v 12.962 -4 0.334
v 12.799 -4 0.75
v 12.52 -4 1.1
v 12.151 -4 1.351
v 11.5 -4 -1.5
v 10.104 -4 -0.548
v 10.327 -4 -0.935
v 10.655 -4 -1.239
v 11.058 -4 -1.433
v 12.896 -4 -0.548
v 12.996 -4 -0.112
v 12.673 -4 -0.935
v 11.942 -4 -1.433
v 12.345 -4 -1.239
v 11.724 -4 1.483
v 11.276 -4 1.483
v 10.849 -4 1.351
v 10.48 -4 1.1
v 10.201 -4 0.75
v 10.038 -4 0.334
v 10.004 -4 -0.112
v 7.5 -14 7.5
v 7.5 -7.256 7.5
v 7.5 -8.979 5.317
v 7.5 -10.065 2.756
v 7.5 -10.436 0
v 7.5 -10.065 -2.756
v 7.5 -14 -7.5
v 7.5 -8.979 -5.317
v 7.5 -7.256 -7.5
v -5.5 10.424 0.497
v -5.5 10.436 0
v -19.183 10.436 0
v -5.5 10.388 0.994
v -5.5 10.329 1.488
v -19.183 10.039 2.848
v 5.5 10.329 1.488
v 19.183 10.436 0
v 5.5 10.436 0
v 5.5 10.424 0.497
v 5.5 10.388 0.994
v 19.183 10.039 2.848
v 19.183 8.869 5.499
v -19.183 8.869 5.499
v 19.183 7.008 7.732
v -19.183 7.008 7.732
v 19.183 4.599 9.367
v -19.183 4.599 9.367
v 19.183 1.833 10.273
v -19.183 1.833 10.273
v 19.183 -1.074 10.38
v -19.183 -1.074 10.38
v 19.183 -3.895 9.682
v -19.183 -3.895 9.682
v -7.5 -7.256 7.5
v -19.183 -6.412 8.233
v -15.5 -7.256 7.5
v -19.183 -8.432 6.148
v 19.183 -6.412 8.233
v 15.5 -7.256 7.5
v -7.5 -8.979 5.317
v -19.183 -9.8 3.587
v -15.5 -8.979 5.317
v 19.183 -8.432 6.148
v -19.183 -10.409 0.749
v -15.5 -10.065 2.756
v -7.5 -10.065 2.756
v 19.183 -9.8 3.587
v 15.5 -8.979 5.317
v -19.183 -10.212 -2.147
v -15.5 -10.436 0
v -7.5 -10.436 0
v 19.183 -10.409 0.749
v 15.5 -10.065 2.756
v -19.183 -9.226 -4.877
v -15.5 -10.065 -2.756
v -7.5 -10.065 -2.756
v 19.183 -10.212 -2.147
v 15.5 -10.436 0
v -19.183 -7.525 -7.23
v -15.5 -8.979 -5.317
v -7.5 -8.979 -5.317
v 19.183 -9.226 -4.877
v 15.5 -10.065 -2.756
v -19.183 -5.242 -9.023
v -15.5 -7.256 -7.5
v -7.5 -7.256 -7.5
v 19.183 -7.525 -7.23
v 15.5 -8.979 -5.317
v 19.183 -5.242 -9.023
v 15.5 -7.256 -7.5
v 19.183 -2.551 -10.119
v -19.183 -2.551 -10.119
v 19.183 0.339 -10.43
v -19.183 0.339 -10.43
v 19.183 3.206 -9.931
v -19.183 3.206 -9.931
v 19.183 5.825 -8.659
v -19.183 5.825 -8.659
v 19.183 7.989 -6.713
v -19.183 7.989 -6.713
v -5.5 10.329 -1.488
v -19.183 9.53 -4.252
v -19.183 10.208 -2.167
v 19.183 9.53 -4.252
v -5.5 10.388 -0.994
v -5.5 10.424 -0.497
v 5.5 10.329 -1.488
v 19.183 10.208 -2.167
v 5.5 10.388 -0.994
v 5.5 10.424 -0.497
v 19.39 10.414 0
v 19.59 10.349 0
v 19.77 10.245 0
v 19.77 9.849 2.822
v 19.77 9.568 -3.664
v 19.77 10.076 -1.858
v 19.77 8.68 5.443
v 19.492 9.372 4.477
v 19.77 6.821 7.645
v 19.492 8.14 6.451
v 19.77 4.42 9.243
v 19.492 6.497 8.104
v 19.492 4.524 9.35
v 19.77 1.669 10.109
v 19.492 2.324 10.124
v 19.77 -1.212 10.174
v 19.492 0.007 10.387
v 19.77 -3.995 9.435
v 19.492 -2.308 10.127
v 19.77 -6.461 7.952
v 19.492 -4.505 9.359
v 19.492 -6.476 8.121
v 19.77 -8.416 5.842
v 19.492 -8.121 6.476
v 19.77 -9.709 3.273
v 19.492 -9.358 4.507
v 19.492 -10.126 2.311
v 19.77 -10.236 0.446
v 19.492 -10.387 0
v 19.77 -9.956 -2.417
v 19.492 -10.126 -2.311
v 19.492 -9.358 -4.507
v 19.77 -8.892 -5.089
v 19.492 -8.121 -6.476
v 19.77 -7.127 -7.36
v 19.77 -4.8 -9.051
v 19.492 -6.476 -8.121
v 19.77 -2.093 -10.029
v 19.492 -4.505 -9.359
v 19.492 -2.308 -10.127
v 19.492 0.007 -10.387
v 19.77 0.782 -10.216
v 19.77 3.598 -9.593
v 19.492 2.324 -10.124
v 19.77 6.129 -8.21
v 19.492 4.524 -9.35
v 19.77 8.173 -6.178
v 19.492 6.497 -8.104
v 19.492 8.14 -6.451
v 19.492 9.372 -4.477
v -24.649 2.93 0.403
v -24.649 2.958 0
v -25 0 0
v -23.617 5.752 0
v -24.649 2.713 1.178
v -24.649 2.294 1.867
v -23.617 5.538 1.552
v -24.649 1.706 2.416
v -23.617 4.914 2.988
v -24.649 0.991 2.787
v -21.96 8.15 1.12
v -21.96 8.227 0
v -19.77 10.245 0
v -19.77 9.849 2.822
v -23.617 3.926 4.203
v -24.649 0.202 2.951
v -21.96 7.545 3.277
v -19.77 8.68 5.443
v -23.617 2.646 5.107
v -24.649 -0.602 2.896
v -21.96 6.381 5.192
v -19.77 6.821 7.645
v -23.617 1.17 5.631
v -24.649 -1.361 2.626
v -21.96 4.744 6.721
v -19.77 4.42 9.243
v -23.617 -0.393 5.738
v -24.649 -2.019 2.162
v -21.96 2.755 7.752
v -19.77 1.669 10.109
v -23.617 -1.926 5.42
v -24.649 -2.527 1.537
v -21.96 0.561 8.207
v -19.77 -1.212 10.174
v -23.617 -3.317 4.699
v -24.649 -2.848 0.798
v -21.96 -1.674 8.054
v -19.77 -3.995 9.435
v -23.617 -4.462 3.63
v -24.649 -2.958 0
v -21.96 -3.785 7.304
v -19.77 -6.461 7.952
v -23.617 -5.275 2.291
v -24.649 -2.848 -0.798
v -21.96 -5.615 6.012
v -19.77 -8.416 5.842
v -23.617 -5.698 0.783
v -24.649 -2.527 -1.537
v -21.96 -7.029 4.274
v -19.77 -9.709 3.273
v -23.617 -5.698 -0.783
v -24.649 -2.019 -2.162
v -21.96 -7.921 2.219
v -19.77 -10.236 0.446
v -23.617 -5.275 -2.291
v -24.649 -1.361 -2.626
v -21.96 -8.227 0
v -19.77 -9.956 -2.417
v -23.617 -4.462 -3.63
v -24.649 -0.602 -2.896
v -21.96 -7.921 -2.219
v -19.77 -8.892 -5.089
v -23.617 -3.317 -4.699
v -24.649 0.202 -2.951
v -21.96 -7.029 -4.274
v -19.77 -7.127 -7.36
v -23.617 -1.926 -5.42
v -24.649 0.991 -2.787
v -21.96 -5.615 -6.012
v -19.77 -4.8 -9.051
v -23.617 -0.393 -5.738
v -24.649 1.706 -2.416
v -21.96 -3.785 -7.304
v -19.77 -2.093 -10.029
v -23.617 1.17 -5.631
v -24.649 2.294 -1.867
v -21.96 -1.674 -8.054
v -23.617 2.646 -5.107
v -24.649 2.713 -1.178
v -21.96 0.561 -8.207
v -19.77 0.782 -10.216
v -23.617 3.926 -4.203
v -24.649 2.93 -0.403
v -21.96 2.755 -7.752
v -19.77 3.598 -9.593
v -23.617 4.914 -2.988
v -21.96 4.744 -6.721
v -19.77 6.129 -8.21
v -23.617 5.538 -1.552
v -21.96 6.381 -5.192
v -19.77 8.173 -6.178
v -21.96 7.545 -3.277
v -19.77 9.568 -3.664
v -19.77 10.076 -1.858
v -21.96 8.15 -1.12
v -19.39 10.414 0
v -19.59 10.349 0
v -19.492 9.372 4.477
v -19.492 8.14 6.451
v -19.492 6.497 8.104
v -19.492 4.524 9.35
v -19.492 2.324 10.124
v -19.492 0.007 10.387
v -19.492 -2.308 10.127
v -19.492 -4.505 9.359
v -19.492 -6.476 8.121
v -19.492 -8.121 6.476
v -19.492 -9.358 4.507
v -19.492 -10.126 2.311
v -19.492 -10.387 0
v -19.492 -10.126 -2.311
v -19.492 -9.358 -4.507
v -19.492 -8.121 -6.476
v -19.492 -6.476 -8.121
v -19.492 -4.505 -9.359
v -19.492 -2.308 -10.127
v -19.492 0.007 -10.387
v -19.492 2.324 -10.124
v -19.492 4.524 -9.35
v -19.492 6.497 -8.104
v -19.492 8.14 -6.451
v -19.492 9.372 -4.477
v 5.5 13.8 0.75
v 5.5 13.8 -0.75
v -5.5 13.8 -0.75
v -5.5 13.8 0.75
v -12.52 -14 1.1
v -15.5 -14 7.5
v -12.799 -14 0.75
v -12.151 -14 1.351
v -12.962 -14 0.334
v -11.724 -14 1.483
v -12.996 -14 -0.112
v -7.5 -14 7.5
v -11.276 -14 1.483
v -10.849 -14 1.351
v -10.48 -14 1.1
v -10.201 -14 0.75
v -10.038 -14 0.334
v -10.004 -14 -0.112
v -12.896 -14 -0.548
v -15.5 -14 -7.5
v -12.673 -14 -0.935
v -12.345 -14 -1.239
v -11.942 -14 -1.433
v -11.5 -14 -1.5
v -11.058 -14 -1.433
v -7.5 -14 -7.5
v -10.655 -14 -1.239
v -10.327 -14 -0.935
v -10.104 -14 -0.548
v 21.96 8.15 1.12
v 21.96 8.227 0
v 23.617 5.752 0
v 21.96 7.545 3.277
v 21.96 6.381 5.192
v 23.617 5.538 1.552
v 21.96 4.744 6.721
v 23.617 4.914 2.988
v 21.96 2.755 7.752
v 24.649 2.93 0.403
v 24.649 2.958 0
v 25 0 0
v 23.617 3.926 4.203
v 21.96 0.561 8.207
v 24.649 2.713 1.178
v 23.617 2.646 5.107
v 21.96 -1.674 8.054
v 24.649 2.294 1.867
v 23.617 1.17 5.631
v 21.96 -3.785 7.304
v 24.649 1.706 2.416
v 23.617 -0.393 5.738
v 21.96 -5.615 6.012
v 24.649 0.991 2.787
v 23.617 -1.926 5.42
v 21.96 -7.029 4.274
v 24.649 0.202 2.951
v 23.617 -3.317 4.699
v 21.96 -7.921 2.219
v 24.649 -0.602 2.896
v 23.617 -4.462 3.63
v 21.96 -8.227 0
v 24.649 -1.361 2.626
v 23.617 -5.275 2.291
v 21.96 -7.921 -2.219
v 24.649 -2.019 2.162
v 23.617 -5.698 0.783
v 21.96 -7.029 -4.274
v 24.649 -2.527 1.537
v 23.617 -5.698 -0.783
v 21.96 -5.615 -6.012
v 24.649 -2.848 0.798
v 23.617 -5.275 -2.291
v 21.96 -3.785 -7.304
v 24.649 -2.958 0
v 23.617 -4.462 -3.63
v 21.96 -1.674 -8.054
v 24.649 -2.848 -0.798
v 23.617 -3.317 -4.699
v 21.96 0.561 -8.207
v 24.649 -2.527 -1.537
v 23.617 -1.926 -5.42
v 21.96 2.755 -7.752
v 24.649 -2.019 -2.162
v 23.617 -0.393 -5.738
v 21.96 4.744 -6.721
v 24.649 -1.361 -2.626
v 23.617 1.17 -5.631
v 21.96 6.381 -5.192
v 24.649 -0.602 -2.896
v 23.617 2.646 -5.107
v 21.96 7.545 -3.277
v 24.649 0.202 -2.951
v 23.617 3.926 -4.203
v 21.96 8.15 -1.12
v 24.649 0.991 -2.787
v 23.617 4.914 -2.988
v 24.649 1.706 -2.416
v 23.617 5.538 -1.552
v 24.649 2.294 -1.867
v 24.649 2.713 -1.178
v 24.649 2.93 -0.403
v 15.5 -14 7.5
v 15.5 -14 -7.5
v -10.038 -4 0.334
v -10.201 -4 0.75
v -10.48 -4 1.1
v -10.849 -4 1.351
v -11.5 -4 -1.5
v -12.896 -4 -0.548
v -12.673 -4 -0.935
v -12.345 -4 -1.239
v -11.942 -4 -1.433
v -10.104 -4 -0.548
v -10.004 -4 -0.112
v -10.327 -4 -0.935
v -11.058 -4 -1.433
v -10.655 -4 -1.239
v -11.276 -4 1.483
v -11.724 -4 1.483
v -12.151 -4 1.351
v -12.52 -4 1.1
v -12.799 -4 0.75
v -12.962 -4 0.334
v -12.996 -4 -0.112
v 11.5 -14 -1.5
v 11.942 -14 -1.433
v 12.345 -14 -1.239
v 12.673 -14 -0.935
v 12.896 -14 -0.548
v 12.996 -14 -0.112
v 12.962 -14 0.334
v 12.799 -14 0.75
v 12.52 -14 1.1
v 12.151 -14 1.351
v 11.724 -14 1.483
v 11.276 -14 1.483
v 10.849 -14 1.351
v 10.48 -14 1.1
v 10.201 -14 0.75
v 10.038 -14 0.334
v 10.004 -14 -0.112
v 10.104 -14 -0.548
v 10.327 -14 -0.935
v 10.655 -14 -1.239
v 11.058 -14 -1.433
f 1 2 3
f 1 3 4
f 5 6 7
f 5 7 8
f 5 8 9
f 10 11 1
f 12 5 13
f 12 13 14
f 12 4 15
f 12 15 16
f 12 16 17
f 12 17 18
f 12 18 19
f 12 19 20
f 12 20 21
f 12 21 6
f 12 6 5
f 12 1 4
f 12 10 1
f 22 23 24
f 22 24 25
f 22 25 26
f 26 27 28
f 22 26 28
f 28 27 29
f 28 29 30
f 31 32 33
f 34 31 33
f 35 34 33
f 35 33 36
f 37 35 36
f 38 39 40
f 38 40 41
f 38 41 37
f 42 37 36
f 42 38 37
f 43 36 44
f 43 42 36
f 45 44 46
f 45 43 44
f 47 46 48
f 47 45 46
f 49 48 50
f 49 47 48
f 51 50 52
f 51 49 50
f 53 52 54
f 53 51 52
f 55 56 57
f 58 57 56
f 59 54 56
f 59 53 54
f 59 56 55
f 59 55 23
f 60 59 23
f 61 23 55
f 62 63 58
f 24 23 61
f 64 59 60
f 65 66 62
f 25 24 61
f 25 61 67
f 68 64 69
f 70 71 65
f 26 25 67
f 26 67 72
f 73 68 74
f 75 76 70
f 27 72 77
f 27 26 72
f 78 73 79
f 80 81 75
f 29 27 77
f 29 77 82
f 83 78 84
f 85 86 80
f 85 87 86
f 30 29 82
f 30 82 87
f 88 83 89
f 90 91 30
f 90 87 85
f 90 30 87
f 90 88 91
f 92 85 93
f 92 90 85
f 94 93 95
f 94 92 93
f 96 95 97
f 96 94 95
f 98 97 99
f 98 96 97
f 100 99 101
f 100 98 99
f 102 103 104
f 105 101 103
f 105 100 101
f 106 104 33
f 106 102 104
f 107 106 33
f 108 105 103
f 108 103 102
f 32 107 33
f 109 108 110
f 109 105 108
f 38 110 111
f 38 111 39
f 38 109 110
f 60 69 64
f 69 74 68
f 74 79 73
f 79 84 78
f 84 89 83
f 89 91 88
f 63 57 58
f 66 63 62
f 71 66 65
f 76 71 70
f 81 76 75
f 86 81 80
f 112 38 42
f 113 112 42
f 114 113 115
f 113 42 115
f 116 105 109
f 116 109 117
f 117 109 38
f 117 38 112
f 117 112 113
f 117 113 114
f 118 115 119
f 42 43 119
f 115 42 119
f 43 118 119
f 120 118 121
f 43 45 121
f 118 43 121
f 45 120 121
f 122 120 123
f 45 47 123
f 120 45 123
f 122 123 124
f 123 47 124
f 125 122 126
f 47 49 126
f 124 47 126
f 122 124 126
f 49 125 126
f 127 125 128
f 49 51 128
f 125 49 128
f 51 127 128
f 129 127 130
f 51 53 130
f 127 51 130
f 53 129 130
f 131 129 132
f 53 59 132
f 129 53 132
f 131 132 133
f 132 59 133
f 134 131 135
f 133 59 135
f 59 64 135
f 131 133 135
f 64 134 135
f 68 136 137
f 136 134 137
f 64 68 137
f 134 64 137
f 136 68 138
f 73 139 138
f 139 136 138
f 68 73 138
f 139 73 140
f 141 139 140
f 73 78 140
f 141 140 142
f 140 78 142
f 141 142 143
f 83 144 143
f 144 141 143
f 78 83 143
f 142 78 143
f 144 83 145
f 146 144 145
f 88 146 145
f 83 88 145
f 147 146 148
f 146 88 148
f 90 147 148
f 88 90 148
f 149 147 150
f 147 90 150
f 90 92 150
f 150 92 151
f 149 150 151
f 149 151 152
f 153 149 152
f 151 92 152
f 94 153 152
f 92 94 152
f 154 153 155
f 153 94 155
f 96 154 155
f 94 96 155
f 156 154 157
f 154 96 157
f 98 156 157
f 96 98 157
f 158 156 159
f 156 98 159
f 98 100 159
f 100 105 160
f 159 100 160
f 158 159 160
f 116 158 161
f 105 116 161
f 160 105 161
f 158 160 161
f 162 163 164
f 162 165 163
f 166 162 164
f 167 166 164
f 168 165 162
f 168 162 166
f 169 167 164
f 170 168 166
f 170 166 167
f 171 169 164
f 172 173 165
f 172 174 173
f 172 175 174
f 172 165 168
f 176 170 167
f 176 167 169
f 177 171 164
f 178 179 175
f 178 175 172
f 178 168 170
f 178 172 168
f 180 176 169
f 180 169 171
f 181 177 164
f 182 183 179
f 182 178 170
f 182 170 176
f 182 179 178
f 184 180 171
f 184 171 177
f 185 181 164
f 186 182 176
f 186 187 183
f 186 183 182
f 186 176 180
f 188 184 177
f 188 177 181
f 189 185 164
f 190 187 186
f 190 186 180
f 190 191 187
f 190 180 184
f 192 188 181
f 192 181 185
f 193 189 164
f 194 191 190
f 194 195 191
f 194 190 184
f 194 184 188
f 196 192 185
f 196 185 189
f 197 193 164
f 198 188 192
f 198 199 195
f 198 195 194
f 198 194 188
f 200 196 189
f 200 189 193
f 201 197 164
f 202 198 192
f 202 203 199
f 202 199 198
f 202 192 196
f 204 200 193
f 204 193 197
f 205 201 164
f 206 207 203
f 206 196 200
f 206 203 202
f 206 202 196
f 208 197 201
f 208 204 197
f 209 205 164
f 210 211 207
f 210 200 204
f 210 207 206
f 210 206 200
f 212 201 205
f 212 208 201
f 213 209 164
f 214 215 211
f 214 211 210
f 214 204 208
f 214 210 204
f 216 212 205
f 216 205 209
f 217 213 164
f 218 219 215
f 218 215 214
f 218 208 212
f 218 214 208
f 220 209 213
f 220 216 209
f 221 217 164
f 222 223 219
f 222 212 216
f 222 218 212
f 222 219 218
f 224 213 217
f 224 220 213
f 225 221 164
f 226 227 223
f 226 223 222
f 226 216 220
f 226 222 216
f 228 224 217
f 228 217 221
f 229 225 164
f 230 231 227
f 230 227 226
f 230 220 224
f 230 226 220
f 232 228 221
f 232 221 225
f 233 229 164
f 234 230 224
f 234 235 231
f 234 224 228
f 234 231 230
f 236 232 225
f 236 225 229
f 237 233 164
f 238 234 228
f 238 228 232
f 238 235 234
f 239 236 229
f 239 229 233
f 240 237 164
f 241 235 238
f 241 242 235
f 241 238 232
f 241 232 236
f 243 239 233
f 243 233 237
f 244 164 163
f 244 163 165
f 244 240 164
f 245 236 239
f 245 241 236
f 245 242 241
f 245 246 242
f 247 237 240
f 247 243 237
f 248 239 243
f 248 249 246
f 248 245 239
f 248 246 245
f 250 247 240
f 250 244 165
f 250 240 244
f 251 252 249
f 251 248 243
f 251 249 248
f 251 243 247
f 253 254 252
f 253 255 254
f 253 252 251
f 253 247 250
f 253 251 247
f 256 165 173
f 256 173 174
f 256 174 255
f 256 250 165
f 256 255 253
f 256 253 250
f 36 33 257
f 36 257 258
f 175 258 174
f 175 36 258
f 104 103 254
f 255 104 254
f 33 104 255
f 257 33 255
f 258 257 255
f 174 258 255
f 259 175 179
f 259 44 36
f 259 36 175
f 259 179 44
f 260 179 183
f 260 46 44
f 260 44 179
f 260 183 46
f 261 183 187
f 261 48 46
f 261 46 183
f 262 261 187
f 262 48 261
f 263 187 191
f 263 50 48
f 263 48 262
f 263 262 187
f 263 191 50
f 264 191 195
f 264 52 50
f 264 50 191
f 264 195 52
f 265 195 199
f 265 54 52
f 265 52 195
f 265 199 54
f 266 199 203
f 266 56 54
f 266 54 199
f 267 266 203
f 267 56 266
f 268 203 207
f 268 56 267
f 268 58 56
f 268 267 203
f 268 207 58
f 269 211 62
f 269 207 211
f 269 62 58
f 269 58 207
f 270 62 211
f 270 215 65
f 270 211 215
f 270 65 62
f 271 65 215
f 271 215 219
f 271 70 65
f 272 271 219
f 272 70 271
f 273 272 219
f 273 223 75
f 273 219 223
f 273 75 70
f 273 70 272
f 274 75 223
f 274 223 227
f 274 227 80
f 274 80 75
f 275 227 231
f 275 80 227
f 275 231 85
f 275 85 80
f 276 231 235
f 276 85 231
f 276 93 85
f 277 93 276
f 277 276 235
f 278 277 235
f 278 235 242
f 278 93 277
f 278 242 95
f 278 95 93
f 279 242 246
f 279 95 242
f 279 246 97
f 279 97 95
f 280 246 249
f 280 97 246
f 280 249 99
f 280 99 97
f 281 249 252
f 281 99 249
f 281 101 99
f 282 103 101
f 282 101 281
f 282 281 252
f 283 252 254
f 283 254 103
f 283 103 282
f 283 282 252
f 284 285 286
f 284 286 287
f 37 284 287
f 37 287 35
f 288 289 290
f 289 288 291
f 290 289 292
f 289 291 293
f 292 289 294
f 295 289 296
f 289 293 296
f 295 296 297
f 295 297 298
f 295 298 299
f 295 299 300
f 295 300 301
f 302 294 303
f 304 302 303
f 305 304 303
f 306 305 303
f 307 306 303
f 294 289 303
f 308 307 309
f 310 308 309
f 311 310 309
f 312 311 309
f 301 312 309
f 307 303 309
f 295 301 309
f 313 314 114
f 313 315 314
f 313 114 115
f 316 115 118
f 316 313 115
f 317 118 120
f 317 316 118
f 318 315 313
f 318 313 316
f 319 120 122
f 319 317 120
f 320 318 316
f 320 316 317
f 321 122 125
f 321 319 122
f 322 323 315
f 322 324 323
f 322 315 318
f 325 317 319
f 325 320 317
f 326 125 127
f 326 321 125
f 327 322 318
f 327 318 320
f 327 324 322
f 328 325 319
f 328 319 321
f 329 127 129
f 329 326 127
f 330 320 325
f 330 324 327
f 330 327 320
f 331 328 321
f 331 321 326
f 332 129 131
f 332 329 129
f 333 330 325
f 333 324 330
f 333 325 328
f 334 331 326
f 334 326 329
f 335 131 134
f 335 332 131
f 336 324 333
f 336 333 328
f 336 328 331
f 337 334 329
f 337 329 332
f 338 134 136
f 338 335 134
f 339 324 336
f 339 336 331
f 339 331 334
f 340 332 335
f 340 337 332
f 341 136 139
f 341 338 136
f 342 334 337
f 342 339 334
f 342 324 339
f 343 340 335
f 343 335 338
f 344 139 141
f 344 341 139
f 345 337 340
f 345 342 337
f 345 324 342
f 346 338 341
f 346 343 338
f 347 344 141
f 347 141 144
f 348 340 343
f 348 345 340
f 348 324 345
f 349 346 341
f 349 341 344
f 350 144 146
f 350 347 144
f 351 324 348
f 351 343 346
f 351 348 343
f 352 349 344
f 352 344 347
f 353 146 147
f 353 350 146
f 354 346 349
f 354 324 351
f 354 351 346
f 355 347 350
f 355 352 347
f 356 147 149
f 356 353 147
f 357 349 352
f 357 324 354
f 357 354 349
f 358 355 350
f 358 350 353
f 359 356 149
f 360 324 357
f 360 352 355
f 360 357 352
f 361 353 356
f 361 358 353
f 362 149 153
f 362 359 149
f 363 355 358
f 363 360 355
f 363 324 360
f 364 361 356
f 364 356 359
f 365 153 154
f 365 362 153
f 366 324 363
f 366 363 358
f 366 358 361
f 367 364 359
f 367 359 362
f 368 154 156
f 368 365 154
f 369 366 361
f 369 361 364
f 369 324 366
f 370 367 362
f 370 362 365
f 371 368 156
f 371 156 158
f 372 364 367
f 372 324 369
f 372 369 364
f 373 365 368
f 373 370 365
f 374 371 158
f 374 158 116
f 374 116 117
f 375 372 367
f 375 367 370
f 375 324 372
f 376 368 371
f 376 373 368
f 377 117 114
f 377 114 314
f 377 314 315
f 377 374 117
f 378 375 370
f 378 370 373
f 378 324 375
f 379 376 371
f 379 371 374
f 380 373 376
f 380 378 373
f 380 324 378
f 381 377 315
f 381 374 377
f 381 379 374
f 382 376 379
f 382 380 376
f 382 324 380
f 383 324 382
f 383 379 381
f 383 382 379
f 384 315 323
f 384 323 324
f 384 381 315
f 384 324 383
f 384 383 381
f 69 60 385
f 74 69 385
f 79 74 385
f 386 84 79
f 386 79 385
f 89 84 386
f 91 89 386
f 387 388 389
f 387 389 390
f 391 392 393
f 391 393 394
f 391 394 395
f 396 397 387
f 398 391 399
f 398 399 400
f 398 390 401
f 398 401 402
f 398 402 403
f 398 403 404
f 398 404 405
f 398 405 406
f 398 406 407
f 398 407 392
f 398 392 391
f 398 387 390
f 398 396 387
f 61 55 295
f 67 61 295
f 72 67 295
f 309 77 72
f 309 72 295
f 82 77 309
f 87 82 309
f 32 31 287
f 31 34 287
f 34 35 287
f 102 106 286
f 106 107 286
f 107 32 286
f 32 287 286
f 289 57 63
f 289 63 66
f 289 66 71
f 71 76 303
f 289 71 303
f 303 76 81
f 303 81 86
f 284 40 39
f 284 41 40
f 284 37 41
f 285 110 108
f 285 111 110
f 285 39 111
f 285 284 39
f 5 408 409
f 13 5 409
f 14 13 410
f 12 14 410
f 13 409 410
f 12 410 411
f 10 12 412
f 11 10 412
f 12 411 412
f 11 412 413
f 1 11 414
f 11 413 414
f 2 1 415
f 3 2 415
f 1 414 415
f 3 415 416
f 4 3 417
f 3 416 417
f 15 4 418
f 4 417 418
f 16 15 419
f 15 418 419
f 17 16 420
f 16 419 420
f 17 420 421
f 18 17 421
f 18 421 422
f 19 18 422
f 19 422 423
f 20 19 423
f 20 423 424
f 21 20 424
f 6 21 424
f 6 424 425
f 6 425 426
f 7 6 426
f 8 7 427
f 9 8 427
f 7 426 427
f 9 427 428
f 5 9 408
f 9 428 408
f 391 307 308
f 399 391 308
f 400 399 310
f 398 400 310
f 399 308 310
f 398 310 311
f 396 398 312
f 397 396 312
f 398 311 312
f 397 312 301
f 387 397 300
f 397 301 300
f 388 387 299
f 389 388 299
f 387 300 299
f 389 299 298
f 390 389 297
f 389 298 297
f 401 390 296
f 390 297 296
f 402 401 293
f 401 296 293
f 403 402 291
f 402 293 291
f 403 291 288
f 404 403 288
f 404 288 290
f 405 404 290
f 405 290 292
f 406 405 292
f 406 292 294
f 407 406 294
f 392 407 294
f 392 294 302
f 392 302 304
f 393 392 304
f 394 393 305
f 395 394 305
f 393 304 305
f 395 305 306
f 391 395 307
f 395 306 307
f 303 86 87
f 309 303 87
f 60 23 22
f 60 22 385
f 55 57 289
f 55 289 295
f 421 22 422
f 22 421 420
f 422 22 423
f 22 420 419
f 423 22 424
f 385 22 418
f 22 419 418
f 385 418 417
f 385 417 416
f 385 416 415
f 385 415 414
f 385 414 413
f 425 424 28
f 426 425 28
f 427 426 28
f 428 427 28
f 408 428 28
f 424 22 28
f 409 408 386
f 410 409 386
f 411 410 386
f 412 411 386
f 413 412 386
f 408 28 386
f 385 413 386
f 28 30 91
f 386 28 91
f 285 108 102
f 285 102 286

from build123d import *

# Parameters (mm, degrees)
SKETCH_3_W          = 8
SKETCH_3_H          = 15
EXTRUDE_1_DEPTH     = 14
SKETCH_4_R          = 1.5
CUT_EXTRUDE_1_DEPTH = 10
FILLET_1_R          = 1
EXTRUDE_2_DEPTH     = 5.5


with BuildPart() as part:
    # ｽｹｯﾁ1 → 回転2 (revolve)
    with BuildSketch(Plane.XY):
        with BuildLine():
            Line((-19.5, 10.435516279), (19.5, 10.435516279))
            ThreePointArc((19.5, 10.435516279), (23.540844472, 5.898092912), (25, 0))
            Line((25, 0), (-25, 0))
            ThreePointArc((-25, 0), (-23.540844472, 5.898092912), (-19.5, 10.435516279))
        make_face()
    revolve(axis=Axis((-19.5, 0, 0), (1, 0, 0)))

    # ｽｹｯﾁ3 → ﾎﾞｽ - 押し出し1 (add)
    with BuildSketch(Plane(origin=(0, 0, 0), x_dir=(1, 0, 0), z_dir=(0, 1, 0))):
        with Locations((-11.5, 0)):
            Rectangle(SKETCH_3_W, SKETCH_3_H)
        with Locations((11.5, 0)):
            Rectangle(SKETCH_3_W, SKETCH_3_H)
    extrude(amount=-EXTRUDE_1_DEPTH)

    # ｽｹｯﾁ4 → ｶｯﾄ - 押し出し1 (cut)
    with BuildSketch(Plane(origin=(0, -14, 0), x_dir=(-1, 0, 0), z_dir=(0, -1, 0))):
        with Locations(Location((-11.5, 0, 0), (0, 0, 90))):
            Circle(SKETCH_4_R)
        with Locations(Location((11.5, 0, 0), (0, 0, 90))):
            Circle(SKETCH_4_R)
    extrude(amount=-CUT_EXTRUDE_1_DEPTH, mode=Mode.SUBTRACT)

    # ﾌｨﾚｯﾄ1
    fillet_1_edges = [part.edges().sort_by_distance(p)[0] for p in [
        (-19.5, -10.435516279, 0),
        (19.5, -10.435516279, 0),
    ]]
    fillet(fillet_1_edges, radius=FILLET_1_R)

    # ｽｹｯﾁ5 → ﾎﾞｽ - 押し出し2 (add, symmetric)
    with BuildSketch(Plane(origin=(0, 0, 0), x_dir=(0, 0, -1), z_dir=(1, 0, 0))):
        Polygon((-1.6, 9.8), (1.6, 9.8), (0.75, 13.8), (-0.75, 13.8), align=None)
    extrude(amount=EXTRUDE_2_DEPTH, both=True)


solid = part.part
